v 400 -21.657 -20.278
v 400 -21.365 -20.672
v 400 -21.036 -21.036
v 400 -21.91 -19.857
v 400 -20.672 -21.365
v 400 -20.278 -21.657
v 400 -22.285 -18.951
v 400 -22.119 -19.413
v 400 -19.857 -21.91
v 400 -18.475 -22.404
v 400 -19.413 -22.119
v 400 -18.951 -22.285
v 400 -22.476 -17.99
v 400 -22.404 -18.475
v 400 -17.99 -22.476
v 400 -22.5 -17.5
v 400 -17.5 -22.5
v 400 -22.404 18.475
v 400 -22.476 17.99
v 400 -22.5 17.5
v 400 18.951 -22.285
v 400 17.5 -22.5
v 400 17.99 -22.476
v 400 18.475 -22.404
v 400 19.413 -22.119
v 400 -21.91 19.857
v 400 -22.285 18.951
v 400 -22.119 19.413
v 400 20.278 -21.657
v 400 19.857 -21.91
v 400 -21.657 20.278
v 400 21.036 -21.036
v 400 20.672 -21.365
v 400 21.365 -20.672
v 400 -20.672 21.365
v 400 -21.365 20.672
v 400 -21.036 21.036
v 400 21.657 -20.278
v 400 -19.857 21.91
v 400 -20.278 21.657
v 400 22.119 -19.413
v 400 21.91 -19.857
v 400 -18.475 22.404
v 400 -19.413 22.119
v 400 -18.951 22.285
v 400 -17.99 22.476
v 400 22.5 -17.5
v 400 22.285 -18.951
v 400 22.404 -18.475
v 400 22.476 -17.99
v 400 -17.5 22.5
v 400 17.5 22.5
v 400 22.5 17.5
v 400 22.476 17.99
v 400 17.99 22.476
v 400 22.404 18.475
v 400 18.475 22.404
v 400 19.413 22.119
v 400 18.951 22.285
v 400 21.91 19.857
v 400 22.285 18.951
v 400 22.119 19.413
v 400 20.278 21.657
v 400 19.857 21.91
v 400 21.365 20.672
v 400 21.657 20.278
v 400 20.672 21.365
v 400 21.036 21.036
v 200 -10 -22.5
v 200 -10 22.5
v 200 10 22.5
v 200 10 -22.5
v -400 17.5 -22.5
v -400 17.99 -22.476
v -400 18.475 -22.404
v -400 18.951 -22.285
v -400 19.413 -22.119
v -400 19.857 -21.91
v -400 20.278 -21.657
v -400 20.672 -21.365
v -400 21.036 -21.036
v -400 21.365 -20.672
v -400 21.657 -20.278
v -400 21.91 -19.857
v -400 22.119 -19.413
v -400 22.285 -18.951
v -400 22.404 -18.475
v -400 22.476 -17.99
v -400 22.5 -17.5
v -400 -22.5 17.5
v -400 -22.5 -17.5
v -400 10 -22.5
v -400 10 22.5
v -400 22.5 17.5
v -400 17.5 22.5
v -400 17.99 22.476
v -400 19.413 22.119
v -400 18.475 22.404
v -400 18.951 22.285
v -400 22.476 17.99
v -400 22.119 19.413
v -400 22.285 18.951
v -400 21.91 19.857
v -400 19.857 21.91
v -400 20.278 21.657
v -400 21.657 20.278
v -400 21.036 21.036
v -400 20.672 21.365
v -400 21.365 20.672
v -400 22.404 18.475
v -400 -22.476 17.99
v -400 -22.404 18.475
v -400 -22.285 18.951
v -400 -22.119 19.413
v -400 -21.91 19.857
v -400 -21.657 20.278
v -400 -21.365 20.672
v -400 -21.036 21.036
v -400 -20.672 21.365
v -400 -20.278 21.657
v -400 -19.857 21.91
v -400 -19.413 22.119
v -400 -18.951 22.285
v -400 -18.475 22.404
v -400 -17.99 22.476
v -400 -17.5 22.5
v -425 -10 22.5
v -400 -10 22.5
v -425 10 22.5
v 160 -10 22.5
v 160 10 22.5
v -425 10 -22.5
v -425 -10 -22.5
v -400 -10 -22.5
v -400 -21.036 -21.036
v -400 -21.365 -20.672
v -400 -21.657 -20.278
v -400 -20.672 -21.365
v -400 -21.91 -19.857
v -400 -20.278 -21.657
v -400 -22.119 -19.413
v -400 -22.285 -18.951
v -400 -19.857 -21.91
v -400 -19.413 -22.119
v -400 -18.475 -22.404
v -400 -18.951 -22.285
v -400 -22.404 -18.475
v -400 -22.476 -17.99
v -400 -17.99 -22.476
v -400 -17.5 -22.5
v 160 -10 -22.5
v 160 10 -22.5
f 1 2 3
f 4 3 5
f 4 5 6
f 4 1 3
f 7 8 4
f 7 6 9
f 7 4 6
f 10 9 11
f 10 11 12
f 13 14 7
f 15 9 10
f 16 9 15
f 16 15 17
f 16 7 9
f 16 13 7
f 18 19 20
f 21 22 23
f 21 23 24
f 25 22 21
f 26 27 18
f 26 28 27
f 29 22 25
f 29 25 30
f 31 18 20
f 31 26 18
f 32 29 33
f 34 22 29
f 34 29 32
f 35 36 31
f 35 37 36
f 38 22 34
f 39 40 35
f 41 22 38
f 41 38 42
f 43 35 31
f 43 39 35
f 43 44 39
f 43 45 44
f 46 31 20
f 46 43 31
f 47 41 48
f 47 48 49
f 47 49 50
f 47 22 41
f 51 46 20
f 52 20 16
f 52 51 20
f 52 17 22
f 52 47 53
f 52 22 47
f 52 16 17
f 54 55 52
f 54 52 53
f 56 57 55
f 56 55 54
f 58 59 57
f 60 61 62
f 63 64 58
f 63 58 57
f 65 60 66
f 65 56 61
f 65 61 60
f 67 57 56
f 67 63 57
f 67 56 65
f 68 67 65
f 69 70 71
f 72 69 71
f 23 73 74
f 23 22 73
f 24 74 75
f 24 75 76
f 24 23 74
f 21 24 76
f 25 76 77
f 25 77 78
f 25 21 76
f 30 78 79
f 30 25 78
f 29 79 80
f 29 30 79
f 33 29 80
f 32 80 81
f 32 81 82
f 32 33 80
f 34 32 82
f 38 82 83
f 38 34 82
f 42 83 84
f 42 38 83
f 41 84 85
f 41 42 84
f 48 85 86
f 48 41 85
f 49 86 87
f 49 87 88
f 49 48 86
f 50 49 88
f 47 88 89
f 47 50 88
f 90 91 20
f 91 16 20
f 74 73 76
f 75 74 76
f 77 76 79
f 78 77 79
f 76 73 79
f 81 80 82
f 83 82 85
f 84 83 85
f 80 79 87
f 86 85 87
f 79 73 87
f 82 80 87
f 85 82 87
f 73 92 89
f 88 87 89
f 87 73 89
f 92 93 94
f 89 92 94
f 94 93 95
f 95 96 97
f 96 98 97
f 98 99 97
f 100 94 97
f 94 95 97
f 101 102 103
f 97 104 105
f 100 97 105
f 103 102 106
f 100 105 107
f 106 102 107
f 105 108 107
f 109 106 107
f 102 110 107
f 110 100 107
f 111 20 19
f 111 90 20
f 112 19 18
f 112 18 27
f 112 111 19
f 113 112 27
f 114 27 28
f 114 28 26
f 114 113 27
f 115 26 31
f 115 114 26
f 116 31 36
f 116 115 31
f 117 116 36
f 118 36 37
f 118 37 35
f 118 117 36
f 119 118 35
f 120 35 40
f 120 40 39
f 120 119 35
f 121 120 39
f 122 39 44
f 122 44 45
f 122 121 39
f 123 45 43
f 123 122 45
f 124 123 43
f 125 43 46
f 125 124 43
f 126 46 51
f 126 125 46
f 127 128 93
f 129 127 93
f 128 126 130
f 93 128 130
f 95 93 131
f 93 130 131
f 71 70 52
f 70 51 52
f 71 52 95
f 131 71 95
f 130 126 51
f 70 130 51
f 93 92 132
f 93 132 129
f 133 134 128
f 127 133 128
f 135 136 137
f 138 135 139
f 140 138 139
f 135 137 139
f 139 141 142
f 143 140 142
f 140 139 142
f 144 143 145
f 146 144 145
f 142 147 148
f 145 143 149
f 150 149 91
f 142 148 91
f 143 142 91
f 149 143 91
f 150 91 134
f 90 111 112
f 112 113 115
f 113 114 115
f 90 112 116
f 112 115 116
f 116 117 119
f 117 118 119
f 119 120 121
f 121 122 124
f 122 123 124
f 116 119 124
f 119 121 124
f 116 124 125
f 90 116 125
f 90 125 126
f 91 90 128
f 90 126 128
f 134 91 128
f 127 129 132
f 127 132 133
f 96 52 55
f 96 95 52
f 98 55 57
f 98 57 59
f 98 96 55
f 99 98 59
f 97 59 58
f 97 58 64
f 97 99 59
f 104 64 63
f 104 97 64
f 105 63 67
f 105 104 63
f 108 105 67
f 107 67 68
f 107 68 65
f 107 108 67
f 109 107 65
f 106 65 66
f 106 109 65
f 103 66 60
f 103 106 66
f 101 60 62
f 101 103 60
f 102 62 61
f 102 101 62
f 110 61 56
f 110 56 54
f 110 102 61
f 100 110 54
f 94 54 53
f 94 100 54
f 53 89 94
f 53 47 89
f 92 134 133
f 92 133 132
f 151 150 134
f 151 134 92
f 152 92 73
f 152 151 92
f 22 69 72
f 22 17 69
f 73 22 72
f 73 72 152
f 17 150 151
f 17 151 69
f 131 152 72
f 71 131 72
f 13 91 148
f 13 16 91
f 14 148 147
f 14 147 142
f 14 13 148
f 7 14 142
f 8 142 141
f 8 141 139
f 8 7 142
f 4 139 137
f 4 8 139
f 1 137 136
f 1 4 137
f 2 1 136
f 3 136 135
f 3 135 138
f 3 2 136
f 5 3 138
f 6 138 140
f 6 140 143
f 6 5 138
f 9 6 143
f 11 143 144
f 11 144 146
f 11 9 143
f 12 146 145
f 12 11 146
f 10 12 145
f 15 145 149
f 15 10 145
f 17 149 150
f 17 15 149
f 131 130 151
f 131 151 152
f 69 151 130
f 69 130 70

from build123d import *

# Parameters (mm, degrees)
F0_W     = 45
F0_H     = 45
F1_DEPTH = 400
F2_W     = 20
F2_H     = 45
F3_DEPTH = 25
F4_R     = 5
F5_W     = 40
F5_H     = 20
F6_DEPTH = 45.001


with BuildPart() as f1:
    # F0 (on Right) → F1 (new body, symmetric)
    with BuildSketch(Plane.YZ):
        Rectangle(F0_W, F0_H)
    extrude(amount=F1_DEPTH, both=True)

    # F2 (on face) → F3 (join)
    with BuildSketch(Plane(origin=(-400, 0, 0), x_dir=(0, -1, 0), z_dir=(-1, 0, 0))):
        Rectangle(F2_W, F2_H)
    extrude(amount=F3_DEPTH)

    # F4
    f4_edges = [f1.edges().sort_by_distance(p)[0] for p in [
        (0, -22.5, -22.5),
        (0, 22.5, -22.5),
        (0, -22.5, 22.5),
        (0, 22.5, 22.5),
    ]]
    fillet(f4_edges, radius=F4_R)

    # F5 (on face) → F6 (cut, through all)
    with BuildSketch(Plane.XY.offset(22.5)):
        with Locations((180, 0)):
            Rectangle(F5_W, F5_H)
    extrude(amount=-F6_DEPTH, mode=Mode.SUBTRACT)


solid = f1.part
